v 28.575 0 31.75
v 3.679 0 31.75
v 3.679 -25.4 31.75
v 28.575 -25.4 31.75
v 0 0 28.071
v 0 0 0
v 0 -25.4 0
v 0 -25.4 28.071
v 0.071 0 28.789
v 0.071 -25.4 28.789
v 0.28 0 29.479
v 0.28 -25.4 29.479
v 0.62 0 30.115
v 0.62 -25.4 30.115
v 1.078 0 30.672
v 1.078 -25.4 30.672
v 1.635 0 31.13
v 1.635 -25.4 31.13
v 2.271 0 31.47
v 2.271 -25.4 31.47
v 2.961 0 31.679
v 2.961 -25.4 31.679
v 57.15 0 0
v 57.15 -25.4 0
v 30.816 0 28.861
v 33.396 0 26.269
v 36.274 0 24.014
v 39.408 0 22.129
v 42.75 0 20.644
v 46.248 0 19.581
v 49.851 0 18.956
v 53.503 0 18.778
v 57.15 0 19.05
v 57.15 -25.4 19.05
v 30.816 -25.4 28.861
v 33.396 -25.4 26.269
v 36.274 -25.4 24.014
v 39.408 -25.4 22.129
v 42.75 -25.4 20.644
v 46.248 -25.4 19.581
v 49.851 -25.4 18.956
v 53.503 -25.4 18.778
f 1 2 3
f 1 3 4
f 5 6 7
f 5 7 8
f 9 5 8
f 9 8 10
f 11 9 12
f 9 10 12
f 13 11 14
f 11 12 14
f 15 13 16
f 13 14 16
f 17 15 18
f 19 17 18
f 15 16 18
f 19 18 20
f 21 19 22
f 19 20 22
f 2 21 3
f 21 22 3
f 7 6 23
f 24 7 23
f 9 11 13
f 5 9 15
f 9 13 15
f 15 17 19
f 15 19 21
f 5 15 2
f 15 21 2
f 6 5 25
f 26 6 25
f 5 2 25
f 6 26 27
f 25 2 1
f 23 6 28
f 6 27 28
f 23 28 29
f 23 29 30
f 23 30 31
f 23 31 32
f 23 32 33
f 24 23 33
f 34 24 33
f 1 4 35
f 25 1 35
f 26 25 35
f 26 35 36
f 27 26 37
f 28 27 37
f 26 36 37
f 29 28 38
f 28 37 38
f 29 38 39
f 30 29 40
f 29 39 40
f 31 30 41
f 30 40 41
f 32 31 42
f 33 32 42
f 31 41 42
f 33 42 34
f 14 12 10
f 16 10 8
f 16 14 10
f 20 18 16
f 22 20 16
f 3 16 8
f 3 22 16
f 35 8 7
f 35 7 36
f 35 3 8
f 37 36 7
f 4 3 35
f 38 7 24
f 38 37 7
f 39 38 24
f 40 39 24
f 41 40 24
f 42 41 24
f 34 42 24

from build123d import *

# Parameters (mm, degrees)
F0_W     = 57.15
F0_H     = 31.75
F1_DEPTH = 25.4
F3_DEPTH = 25.4
F4_R     = 3.679261


with BuildPart() as f1:
    # F0 (on Front) → F1 (new body)
    with BuildSketch(Plane.XZ):
        with Locations((28.575, 15.875)):
            Rectangle(F0_W, F0_H)
    extrude(amount=F1_DEPTH)

    # F2 (on face) → F3 (cut)
    with BuildSketch(Plane.XZ.offset(25.4)):
        with BuildLine():
            Line((57.15, 31.75), (28.575, 31.75))
            ThreePointArc((28.575, 31.75), (41.05591, 21.335173), (57.15, 19.05))
            Line((57.15, 19.05), (57.15, 31.75))
        make_face()
    extrude(amount=-F3_DEPTH, mode=Mode.SUBTRACT)

    # F4
    f4_edges = [f1.edges().sort_by_distance(p)[0] for p in [
        (0, -12.7, 31.75),
    ]]
    fillet(f4_edges, radius=F4_R)


solid = f1.part
